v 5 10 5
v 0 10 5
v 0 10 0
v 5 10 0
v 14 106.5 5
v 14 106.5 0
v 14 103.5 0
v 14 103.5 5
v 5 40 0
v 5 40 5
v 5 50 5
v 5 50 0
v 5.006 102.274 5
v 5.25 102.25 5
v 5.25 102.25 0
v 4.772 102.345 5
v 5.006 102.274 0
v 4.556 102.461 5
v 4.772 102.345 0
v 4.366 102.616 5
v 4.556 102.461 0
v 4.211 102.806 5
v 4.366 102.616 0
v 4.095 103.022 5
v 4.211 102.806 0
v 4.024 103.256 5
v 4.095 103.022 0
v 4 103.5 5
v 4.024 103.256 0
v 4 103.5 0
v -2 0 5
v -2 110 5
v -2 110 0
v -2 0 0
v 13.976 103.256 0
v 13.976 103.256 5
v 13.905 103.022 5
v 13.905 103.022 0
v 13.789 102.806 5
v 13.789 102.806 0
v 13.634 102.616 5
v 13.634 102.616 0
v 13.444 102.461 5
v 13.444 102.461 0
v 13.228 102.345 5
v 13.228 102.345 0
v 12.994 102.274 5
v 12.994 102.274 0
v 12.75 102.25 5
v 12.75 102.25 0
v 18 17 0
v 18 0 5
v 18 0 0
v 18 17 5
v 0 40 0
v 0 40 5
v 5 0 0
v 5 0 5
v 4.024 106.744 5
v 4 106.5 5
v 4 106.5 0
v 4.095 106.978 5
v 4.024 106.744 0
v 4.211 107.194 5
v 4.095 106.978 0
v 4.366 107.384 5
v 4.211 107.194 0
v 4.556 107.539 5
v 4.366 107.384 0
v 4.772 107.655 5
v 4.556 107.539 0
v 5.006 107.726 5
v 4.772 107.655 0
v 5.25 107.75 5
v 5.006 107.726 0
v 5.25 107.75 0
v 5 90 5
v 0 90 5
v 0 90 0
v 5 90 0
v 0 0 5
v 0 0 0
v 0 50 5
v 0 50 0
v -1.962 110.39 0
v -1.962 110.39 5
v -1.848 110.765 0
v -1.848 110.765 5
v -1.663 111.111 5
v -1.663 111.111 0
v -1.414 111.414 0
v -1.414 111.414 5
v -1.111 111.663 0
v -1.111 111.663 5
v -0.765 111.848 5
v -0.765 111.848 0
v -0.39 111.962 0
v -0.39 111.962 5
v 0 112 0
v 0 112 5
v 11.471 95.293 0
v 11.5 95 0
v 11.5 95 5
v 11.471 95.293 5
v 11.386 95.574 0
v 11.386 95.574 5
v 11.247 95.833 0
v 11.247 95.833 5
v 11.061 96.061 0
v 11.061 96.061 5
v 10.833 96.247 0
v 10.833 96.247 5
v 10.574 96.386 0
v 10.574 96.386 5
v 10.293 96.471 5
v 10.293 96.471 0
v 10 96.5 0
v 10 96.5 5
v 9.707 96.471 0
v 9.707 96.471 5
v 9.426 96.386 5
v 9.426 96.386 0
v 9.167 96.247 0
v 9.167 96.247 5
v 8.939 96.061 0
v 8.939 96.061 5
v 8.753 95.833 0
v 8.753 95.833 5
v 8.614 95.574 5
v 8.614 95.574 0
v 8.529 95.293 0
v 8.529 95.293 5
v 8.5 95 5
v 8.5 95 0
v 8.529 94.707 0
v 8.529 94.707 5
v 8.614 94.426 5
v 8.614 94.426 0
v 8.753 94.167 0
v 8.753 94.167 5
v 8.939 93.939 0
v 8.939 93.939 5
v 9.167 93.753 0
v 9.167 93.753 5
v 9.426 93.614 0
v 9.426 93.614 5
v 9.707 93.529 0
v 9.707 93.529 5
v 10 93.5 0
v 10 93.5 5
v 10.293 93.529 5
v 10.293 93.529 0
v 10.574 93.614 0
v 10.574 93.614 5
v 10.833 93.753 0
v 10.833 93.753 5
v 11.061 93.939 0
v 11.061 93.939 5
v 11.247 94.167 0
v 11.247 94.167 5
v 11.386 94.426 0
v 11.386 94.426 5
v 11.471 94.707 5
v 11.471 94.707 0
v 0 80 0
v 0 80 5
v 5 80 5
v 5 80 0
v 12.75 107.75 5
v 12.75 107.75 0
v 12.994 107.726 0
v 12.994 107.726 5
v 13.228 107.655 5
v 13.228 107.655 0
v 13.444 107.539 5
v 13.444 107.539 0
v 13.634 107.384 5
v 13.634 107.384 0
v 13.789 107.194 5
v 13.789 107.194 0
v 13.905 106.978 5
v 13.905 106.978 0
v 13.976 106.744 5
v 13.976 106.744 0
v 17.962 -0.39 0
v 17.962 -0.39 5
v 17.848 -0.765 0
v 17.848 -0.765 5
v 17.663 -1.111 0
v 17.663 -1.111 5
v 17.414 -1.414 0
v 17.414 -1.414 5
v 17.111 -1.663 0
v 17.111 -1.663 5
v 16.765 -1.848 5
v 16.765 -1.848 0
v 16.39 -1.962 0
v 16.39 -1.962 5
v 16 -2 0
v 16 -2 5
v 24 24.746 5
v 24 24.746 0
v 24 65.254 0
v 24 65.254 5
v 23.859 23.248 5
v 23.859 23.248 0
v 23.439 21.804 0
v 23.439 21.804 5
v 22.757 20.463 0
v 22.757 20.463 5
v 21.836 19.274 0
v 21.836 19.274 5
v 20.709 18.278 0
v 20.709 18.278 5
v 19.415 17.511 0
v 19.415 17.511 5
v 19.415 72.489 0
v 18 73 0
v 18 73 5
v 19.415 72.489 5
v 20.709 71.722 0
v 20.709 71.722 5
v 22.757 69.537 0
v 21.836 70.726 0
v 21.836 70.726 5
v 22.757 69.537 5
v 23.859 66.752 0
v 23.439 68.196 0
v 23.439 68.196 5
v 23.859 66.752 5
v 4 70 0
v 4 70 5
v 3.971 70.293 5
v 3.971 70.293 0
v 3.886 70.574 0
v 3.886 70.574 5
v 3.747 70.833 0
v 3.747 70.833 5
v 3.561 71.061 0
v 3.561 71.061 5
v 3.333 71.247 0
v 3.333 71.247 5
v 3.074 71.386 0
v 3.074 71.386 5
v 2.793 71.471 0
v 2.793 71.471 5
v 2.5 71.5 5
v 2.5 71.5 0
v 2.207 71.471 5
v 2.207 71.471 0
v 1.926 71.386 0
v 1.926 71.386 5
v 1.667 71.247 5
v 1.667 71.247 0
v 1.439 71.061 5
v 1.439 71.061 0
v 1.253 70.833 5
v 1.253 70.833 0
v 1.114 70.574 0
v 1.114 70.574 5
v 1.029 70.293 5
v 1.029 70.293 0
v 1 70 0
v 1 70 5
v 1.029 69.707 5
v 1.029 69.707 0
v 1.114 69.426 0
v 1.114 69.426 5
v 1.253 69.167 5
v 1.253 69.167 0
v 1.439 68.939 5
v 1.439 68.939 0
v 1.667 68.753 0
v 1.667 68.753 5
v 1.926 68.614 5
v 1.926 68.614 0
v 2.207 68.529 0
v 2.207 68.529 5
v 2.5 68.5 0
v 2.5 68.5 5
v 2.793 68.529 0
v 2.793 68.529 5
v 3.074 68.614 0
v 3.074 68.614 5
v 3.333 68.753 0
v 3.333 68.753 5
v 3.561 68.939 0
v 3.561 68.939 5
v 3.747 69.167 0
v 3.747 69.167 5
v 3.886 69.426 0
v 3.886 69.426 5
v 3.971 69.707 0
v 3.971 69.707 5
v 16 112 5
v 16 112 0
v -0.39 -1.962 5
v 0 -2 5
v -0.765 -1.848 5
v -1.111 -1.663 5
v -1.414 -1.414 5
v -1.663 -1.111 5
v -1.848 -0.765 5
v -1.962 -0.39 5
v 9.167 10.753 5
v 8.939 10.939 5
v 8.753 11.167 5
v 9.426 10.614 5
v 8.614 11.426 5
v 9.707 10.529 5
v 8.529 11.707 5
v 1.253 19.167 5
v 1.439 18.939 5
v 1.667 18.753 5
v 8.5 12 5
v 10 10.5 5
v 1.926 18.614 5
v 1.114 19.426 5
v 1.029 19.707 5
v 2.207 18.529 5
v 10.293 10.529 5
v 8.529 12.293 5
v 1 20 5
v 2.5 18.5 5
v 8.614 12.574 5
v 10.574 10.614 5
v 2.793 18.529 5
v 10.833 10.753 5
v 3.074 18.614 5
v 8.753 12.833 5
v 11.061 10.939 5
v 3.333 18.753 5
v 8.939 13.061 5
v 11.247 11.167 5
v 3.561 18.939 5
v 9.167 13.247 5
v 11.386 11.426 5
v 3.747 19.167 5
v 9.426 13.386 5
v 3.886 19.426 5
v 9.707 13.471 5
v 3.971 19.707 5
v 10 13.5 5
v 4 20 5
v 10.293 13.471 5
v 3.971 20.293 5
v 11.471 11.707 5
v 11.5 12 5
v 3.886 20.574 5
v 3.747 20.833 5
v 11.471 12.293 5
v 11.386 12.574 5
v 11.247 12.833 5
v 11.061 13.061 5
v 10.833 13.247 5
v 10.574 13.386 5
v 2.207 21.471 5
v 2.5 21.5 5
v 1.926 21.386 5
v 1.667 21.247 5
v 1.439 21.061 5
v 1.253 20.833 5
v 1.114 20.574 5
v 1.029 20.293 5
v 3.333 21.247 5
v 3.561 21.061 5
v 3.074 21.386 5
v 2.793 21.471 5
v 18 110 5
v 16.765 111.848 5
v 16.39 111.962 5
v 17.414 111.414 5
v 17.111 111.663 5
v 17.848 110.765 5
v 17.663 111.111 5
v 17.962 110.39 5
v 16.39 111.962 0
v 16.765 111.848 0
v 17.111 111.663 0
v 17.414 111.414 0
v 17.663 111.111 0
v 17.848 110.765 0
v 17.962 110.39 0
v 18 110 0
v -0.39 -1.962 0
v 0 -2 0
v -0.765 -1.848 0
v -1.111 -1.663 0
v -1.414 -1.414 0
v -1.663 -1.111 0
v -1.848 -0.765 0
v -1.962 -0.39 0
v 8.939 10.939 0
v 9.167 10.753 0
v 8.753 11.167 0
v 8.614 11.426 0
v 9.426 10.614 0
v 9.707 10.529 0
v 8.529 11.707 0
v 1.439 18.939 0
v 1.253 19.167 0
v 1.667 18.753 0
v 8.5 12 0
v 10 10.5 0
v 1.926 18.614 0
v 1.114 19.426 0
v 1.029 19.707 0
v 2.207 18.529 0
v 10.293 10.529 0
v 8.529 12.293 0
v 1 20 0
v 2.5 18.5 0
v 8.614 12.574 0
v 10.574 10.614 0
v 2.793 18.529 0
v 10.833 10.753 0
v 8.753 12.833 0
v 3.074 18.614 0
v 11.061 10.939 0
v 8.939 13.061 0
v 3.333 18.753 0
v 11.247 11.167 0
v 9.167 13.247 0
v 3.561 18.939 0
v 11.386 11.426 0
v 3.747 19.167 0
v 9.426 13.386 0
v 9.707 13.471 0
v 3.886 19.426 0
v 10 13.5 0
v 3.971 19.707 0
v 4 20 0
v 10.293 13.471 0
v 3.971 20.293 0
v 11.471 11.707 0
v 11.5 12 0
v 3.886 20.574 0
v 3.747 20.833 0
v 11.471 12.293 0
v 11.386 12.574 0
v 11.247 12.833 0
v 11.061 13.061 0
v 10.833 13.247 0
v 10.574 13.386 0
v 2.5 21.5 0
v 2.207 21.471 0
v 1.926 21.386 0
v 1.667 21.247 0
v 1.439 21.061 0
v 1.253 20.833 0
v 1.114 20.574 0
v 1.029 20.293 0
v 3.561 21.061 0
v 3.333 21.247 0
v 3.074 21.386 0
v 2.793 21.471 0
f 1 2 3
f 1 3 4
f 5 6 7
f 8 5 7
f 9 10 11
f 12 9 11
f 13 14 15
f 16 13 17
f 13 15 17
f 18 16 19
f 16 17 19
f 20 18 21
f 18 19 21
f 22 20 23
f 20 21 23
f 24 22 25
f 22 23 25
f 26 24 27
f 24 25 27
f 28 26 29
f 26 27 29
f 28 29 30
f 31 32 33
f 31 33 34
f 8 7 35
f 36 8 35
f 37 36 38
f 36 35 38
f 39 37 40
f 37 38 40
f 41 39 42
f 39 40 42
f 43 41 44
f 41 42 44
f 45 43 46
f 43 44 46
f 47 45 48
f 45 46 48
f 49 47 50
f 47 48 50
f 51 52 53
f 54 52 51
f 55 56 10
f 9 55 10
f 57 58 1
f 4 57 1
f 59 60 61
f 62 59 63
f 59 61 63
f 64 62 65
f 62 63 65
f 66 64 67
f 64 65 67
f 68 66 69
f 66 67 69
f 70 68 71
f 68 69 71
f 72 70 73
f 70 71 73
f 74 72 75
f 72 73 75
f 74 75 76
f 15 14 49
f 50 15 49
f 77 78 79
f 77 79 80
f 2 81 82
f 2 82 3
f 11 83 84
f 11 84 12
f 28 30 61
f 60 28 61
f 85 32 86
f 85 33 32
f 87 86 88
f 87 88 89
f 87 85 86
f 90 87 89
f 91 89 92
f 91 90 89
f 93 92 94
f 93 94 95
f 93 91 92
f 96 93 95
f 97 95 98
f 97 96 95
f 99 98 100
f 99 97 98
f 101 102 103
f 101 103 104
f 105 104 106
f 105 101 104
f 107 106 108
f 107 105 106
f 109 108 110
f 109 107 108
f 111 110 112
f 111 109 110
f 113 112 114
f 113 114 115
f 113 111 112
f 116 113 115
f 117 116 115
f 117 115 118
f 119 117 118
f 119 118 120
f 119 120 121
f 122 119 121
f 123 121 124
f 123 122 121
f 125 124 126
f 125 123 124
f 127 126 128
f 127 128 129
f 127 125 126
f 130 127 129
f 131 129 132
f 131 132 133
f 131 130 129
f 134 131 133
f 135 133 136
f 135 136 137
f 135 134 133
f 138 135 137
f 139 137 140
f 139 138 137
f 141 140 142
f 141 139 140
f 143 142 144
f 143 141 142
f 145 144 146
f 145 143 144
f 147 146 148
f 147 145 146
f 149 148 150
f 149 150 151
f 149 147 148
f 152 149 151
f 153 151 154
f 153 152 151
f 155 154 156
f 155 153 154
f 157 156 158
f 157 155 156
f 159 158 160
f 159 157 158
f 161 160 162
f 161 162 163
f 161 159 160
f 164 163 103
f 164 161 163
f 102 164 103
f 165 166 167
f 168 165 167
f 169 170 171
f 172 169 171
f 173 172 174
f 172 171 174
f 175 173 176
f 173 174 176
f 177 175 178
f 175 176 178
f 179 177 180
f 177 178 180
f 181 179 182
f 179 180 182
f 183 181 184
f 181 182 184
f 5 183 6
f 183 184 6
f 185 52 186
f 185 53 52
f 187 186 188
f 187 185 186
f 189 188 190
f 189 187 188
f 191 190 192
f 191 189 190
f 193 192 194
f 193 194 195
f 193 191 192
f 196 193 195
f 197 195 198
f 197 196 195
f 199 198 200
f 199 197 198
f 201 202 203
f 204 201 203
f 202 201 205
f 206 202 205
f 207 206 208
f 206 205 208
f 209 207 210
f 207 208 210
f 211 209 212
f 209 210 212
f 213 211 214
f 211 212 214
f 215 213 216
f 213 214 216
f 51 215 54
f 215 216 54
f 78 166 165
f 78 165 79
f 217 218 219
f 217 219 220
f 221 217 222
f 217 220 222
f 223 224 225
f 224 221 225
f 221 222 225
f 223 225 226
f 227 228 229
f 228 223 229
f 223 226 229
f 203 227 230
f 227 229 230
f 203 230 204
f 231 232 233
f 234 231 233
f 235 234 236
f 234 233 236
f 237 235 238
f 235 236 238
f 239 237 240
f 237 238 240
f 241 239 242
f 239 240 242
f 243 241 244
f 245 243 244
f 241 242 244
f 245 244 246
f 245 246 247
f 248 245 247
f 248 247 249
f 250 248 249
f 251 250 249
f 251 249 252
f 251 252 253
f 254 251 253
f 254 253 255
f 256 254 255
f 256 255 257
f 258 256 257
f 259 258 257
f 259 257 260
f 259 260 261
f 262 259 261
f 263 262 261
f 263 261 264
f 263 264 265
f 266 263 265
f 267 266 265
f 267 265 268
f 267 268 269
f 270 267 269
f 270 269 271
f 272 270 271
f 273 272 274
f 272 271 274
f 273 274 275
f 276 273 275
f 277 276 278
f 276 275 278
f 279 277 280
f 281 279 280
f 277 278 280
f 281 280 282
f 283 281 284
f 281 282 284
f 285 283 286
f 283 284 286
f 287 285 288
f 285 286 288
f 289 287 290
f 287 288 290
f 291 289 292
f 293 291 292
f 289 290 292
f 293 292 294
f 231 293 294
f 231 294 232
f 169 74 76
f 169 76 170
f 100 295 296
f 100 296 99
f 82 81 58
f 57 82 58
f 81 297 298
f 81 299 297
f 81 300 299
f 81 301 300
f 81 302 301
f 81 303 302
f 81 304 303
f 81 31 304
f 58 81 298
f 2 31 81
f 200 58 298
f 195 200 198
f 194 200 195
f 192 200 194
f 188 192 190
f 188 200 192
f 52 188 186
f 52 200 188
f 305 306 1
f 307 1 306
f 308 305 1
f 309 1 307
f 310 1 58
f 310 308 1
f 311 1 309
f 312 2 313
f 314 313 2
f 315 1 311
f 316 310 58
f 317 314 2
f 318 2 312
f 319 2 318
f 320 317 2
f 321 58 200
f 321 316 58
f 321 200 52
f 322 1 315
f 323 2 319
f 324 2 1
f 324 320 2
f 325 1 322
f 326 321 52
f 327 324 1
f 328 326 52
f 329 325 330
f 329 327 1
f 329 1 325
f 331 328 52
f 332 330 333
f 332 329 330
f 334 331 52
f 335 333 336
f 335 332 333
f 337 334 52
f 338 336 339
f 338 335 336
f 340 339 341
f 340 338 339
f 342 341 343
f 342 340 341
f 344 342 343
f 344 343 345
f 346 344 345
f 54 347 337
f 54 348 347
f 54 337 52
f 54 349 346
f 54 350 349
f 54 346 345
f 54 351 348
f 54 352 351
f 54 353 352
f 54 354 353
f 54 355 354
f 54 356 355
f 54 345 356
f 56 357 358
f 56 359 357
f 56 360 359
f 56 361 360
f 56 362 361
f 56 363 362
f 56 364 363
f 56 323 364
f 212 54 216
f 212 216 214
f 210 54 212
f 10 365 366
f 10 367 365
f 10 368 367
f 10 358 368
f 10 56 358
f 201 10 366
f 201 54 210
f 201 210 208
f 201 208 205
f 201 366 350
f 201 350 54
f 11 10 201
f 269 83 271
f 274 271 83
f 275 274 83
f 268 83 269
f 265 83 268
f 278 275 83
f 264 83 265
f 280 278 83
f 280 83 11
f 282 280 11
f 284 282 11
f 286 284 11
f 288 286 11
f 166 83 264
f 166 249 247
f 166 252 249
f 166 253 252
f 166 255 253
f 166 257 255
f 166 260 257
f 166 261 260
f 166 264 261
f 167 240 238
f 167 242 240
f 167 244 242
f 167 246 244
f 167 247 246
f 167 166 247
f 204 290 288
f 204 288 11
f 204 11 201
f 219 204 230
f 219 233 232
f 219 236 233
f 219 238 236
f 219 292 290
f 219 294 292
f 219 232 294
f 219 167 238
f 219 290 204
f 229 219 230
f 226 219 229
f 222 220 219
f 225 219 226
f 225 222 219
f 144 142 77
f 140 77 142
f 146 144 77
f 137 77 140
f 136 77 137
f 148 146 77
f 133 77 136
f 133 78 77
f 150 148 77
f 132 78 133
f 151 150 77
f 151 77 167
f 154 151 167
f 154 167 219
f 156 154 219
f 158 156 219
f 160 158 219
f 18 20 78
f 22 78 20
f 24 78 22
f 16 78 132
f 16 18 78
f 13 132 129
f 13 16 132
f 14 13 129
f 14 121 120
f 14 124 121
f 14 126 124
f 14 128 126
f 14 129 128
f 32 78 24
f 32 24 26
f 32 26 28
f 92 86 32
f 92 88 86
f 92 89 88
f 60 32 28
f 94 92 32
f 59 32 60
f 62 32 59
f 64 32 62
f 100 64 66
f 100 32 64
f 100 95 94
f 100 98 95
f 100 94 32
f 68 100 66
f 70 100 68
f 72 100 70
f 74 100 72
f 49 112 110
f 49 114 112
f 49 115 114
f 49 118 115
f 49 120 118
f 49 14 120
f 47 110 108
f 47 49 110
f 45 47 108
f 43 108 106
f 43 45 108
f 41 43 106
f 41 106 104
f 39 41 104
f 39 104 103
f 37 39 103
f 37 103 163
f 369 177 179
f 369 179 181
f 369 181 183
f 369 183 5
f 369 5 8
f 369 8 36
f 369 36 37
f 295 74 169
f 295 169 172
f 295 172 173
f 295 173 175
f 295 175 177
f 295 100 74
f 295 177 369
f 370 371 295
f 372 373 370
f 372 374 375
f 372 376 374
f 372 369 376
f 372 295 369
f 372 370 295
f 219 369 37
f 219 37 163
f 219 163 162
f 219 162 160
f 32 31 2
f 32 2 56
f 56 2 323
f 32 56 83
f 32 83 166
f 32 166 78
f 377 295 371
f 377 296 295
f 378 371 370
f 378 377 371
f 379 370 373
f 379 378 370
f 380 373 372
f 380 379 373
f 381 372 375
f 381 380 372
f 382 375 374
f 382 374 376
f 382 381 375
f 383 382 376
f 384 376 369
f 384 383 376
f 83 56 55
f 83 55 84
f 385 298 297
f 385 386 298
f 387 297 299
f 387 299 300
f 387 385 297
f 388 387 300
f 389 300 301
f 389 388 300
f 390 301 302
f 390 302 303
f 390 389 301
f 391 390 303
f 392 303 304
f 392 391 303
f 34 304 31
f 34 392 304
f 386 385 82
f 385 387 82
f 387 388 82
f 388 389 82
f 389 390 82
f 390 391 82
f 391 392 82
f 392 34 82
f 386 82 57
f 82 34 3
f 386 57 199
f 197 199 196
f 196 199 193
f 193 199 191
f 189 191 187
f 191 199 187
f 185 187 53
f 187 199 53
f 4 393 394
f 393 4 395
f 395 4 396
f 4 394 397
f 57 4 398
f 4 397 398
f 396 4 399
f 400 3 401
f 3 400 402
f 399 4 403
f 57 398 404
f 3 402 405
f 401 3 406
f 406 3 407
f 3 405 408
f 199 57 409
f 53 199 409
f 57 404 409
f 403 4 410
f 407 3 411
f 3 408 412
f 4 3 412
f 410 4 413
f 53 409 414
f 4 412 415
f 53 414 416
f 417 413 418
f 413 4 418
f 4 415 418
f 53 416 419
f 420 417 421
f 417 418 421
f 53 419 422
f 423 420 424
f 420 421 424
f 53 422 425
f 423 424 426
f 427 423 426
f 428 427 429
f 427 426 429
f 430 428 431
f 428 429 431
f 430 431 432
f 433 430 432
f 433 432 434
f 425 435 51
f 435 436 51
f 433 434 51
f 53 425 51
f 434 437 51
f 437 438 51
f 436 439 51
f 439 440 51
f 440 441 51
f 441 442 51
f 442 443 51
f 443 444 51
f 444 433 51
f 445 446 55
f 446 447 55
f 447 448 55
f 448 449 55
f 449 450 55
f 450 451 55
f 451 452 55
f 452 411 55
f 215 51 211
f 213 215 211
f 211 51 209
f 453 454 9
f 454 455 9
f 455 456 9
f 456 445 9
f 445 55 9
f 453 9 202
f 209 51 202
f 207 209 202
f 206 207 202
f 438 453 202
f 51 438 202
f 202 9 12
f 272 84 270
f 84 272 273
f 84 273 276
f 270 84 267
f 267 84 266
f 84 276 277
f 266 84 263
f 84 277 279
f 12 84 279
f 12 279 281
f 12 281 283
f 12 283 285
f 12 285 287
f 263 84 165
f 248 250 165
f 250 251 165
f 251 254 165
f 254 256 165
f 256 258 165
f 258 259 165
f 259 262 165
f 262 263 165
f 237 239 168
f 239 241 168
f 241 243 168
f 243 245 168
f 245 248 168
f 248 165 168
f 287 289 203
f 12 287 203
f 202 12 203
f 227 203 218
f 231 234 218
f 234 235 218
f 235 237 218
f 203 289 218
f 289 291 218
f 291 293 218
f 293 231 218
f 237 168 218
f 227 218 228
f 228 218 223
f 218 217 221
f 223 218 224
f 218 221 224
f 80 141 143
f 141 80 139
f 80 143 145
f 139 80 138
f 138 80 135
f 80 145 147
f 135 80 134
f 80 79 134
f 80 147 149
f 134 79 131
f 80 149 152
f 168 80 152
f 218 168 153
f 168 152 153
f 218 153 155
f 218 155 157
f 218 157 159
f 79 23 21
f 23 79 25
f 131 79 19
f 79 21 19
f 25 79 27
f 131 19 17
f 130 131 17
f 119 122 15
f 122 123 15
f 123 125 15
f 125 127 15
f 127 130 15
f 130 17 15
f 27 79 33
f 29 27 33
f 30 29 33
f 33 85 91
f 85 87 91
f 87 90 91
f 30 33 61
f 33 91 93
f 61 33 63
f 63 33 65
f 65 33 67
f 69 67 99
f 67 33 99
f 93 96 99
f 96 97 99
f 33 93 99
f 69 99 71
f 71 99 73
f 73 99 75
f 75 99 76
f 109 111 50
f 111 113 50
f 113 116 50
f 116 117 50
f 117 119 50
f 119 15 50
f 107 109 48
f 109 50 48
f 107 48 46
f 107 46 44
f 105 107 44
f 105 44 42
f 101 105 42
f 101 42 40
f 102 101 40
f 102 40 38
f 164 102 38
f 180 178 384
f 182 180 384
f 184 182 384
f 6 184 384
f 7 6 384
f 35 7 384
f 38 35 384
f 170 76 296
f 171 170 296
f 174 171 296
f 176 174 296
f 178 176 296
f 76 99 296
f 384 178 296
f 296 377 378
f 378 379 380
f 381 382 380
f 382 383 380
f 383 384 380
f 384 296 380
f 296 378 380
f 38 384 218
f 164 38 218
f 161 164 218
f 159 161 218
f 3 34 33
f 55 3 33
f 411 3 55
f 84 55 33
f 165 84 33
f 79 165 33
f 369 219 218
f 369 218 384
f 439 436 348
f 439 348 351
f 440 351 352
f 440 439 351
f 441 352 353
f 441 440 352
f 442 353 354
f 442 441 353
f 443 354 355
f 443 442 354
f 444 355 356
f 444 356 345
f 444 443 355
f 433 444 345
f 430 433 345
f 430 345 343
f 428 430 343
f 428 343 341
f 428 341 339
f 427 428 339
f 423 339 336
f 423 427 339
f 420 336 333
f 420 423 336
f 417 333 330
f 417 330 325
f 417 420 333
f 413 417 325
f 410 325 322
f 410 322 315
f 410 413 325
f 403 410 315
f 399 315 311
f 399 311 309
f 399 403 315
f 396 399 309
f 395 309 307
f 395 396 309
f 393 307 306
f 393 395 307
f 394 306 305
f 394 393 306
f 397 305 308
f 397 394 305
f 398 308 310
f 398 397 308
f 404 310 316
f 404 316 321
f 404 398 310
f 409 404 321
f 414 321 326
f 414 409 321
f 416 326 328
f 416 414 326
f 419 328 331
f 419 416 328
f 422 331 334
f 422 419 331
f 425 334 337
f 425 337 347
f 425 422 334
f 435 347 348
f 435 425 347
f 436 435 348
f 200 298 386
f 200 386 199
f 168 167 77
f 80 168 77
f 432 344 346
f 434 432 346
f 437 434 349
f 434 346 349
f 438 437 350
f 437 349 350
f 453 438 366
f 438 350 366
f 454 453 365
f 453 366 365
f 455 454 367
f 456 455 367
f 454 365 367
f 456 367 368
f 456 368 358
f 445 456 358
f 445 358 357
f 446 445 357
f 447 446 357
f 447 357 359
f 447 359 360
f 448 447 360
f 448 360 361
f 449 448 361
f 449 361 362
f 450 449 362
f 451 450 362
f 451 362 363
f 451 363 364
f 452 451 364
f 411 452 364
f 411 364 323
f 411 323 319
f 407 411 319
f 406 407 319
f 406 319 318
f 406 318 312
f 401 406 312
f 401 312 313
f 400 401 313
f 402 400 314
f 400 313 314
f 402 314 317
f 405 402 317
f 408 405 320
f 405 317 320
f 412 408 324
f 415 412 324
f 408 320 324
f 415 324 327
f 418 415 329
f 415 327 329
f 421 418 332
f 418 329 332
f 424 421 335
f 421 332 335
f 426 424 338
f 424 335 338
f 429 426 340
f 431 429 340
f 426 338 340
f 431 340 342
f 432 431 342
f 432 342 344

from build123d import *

# Parameters (mm, degrees)
SKETCH1_W           = 24
SKETCH1_H           = 110
SKETCH1_R           = 1.5
BOSS_EXTRUDE1_DEPTH = 5
SKETCH2_W           = 6
SKETCH2_H           = 37
SKETCH2_H_2         = 17
CUT_EXTRUDE1_DEPTH  = 113.698713391
BOSS_EXTRUDE2_DEPTH = 5
SKETCH4_R           = 1.5
SKETCH4_W           = 5
SKETCH4_H           = 10
CUT_EXTRUDE2_DEPTH  = 115.651646303
FILLET1_R           = 2
FILLET2_R           = 8
SKETCH5_W           = 7.5
SKETCH5_H           = 5.5
CUT_EXTRUDE3_DEPTH  = 115.651646303


with BuildPart() as part:
    # Sketch1 → Boss-Extrude1 (new body)
    with BuildSketch(Plane.XY):
        with Locations((12, 55)):
            Rectangle(SKETCH1_W, SKETCH1_H)
        with Locations((10, 12)):
            Circle(SKETCH1_R, mode=Mode.SUBTRACT)
        with Locations((10, 95)):
            Circle(SKETCH1_R, mode=Mode.SUBTRACT)
        with BuildLine():
            Line((4, 103.5), (4, 106.5))
            ThreePointArc((4, 106.5), (5.25, 107.75), (6.5, 106.5))
            Line((6.5, 106.5), (6.5, 103.5))
            ThreePointArc((6.5, 103.5), (5.25, 102.25), (4, 103.5))
        make_face(mode=Mode.SUBTRACT)
        with BuildLine():
            Line((11.5, 103.5), (11.5, 106.5))
            ThreePointArc((11.5, 106.5), (12.75, 107.75), (14, 106.5))
            Line((14, 106.5), (14, 103.5))
            ThreePointArc((14, 103.5), (12.75, 102.25), (11.5, 103.5))
        make_face(mode=Mode.SUBTRACT)
    extrude(amount=BOSS_EXTRUDE1_DEPTH)

    # Sketch2 → Cut-Extrude1 (cut, through all)
    with BuildSketch(Plane.XY.offset(5)):
        with Locations((21, 91.5)):
            Rectangle(SKETCH2_W, SKETCH2_H)
        with Locations((21, 8.5)):
            Rectangle(SKETCH2_W, SKETCH2_H_2)
    extrude(amount=-CUT_EXTRUDE1_DEPTH, mode=Mode.SUBTRACT)

    # Sketch3 → Boss-Extrude2 (add)
    with BuildSketch(Plane.XY.offset(5)):
        Polygon((18, -2), (18, 0), (0, 0), (0, 110), (18, 110), (18, 112), (-2, 112), (-2, -2), align=None)
    extrude(amount=-BOSS_EXTRUDE2_DEPTH)

    # Sketch4 → Cut-Extrude2 (cut, through all)
    with BuildSketch(Plane.XY.offset(5)):
        with Locations((2.5, 20)):
            Circle(SKETCH4_R)
        with Locations((2.5, 70)):
            Circle(SKETCH4_R)
        with Locations((2.5, 5)):
            Rectangle(SKETCH4_W, SKETCH4_H)
        with Locations((2.5, 85)):
            Rectangle(SKETCH4_W, SKETCH4_H)
        with Locations((2.5, 45)):
            Rectangle(SKETCH4_W, SKETCH4_H)
    extrude(amount=-CUT_EXTRUDE2_DEPTH, mode=Mode.SUBTRACT)

    # Fillet1
    fillet1_edges = [part.edges().sort_by_distance(p)[0] for p in [
        (18, 112, 2.5),
        (-2, 112, 2.5),
        (-2, -2, 2.5),
        (18, -2, 2.5),
    ]]
    fillet(fillet1_edges, radius=FILLET1_R)

    # Fillet2
    # the kernel refuses this fillet: 8 mm, written as the material it takes off along each edge
    with BuildSketch(Plane(origin=(24, 17, 24.364916731), x_dir=(0, 1, 0), z_dir=(0, 0, -1))) as fillet2_piece_1:
        with BuildLine():
            CenterArc((7.745966692, -8), FILLET2_R, 90, 75.522487814)
            Line((0, -6), (-0.154919334, -5.96))
            ThreePointArc((-0.154919334, -5.96), (-0.16, -3), (-0.16, 0))
            Line((-0.16, 0), (0, 0.16))
            Line((0, 0.16), (7.745966692, 0.16))
            Line((7.745966692, 0.16), (7.745966692, 0))
        make_face()
    extrude(amount=43.729833462, mode=Mode.SUBTRACT)
    with BuildSketch(Plane(origin=(24, 73, 24.364916731), x_dir=(-1, 0, 0), z_dir=(0, 0, -1))) as fillet2_piece_2:
        with BuildLine():
            CenterArc((8, -7.745966692), FILLET2_R, 104.477512186, 75.522487814)
            Line((0, -7.745966692), (-0.16, -7.745966692))
            Line((-0.16, -7.745966692), (-0.16, 0))
            Line((-0.16, 0), (0, 0.16))
            ThreePointArc((0, 0.16), (3, 0.16), (5.96, 0.154919334))
            Line((5.96, 0.154919334), (6, 0))
        make_face()
    extrude(amount=43.729833462, mode=Mode.SUBTRACT)

    # Sketch5 → Cut-Extrude3 (cut, through all)
    with BuildSketch(Plane.XY.offset(5)):
        with Locations((9, 105)):
            Rectangle(SKETCH5_W, SKETCH5_H)
    extrude(amount=-CUT_EXTRUDE3_DEPTH, mode=Mode.SUBTRACT)


solid = part.part
